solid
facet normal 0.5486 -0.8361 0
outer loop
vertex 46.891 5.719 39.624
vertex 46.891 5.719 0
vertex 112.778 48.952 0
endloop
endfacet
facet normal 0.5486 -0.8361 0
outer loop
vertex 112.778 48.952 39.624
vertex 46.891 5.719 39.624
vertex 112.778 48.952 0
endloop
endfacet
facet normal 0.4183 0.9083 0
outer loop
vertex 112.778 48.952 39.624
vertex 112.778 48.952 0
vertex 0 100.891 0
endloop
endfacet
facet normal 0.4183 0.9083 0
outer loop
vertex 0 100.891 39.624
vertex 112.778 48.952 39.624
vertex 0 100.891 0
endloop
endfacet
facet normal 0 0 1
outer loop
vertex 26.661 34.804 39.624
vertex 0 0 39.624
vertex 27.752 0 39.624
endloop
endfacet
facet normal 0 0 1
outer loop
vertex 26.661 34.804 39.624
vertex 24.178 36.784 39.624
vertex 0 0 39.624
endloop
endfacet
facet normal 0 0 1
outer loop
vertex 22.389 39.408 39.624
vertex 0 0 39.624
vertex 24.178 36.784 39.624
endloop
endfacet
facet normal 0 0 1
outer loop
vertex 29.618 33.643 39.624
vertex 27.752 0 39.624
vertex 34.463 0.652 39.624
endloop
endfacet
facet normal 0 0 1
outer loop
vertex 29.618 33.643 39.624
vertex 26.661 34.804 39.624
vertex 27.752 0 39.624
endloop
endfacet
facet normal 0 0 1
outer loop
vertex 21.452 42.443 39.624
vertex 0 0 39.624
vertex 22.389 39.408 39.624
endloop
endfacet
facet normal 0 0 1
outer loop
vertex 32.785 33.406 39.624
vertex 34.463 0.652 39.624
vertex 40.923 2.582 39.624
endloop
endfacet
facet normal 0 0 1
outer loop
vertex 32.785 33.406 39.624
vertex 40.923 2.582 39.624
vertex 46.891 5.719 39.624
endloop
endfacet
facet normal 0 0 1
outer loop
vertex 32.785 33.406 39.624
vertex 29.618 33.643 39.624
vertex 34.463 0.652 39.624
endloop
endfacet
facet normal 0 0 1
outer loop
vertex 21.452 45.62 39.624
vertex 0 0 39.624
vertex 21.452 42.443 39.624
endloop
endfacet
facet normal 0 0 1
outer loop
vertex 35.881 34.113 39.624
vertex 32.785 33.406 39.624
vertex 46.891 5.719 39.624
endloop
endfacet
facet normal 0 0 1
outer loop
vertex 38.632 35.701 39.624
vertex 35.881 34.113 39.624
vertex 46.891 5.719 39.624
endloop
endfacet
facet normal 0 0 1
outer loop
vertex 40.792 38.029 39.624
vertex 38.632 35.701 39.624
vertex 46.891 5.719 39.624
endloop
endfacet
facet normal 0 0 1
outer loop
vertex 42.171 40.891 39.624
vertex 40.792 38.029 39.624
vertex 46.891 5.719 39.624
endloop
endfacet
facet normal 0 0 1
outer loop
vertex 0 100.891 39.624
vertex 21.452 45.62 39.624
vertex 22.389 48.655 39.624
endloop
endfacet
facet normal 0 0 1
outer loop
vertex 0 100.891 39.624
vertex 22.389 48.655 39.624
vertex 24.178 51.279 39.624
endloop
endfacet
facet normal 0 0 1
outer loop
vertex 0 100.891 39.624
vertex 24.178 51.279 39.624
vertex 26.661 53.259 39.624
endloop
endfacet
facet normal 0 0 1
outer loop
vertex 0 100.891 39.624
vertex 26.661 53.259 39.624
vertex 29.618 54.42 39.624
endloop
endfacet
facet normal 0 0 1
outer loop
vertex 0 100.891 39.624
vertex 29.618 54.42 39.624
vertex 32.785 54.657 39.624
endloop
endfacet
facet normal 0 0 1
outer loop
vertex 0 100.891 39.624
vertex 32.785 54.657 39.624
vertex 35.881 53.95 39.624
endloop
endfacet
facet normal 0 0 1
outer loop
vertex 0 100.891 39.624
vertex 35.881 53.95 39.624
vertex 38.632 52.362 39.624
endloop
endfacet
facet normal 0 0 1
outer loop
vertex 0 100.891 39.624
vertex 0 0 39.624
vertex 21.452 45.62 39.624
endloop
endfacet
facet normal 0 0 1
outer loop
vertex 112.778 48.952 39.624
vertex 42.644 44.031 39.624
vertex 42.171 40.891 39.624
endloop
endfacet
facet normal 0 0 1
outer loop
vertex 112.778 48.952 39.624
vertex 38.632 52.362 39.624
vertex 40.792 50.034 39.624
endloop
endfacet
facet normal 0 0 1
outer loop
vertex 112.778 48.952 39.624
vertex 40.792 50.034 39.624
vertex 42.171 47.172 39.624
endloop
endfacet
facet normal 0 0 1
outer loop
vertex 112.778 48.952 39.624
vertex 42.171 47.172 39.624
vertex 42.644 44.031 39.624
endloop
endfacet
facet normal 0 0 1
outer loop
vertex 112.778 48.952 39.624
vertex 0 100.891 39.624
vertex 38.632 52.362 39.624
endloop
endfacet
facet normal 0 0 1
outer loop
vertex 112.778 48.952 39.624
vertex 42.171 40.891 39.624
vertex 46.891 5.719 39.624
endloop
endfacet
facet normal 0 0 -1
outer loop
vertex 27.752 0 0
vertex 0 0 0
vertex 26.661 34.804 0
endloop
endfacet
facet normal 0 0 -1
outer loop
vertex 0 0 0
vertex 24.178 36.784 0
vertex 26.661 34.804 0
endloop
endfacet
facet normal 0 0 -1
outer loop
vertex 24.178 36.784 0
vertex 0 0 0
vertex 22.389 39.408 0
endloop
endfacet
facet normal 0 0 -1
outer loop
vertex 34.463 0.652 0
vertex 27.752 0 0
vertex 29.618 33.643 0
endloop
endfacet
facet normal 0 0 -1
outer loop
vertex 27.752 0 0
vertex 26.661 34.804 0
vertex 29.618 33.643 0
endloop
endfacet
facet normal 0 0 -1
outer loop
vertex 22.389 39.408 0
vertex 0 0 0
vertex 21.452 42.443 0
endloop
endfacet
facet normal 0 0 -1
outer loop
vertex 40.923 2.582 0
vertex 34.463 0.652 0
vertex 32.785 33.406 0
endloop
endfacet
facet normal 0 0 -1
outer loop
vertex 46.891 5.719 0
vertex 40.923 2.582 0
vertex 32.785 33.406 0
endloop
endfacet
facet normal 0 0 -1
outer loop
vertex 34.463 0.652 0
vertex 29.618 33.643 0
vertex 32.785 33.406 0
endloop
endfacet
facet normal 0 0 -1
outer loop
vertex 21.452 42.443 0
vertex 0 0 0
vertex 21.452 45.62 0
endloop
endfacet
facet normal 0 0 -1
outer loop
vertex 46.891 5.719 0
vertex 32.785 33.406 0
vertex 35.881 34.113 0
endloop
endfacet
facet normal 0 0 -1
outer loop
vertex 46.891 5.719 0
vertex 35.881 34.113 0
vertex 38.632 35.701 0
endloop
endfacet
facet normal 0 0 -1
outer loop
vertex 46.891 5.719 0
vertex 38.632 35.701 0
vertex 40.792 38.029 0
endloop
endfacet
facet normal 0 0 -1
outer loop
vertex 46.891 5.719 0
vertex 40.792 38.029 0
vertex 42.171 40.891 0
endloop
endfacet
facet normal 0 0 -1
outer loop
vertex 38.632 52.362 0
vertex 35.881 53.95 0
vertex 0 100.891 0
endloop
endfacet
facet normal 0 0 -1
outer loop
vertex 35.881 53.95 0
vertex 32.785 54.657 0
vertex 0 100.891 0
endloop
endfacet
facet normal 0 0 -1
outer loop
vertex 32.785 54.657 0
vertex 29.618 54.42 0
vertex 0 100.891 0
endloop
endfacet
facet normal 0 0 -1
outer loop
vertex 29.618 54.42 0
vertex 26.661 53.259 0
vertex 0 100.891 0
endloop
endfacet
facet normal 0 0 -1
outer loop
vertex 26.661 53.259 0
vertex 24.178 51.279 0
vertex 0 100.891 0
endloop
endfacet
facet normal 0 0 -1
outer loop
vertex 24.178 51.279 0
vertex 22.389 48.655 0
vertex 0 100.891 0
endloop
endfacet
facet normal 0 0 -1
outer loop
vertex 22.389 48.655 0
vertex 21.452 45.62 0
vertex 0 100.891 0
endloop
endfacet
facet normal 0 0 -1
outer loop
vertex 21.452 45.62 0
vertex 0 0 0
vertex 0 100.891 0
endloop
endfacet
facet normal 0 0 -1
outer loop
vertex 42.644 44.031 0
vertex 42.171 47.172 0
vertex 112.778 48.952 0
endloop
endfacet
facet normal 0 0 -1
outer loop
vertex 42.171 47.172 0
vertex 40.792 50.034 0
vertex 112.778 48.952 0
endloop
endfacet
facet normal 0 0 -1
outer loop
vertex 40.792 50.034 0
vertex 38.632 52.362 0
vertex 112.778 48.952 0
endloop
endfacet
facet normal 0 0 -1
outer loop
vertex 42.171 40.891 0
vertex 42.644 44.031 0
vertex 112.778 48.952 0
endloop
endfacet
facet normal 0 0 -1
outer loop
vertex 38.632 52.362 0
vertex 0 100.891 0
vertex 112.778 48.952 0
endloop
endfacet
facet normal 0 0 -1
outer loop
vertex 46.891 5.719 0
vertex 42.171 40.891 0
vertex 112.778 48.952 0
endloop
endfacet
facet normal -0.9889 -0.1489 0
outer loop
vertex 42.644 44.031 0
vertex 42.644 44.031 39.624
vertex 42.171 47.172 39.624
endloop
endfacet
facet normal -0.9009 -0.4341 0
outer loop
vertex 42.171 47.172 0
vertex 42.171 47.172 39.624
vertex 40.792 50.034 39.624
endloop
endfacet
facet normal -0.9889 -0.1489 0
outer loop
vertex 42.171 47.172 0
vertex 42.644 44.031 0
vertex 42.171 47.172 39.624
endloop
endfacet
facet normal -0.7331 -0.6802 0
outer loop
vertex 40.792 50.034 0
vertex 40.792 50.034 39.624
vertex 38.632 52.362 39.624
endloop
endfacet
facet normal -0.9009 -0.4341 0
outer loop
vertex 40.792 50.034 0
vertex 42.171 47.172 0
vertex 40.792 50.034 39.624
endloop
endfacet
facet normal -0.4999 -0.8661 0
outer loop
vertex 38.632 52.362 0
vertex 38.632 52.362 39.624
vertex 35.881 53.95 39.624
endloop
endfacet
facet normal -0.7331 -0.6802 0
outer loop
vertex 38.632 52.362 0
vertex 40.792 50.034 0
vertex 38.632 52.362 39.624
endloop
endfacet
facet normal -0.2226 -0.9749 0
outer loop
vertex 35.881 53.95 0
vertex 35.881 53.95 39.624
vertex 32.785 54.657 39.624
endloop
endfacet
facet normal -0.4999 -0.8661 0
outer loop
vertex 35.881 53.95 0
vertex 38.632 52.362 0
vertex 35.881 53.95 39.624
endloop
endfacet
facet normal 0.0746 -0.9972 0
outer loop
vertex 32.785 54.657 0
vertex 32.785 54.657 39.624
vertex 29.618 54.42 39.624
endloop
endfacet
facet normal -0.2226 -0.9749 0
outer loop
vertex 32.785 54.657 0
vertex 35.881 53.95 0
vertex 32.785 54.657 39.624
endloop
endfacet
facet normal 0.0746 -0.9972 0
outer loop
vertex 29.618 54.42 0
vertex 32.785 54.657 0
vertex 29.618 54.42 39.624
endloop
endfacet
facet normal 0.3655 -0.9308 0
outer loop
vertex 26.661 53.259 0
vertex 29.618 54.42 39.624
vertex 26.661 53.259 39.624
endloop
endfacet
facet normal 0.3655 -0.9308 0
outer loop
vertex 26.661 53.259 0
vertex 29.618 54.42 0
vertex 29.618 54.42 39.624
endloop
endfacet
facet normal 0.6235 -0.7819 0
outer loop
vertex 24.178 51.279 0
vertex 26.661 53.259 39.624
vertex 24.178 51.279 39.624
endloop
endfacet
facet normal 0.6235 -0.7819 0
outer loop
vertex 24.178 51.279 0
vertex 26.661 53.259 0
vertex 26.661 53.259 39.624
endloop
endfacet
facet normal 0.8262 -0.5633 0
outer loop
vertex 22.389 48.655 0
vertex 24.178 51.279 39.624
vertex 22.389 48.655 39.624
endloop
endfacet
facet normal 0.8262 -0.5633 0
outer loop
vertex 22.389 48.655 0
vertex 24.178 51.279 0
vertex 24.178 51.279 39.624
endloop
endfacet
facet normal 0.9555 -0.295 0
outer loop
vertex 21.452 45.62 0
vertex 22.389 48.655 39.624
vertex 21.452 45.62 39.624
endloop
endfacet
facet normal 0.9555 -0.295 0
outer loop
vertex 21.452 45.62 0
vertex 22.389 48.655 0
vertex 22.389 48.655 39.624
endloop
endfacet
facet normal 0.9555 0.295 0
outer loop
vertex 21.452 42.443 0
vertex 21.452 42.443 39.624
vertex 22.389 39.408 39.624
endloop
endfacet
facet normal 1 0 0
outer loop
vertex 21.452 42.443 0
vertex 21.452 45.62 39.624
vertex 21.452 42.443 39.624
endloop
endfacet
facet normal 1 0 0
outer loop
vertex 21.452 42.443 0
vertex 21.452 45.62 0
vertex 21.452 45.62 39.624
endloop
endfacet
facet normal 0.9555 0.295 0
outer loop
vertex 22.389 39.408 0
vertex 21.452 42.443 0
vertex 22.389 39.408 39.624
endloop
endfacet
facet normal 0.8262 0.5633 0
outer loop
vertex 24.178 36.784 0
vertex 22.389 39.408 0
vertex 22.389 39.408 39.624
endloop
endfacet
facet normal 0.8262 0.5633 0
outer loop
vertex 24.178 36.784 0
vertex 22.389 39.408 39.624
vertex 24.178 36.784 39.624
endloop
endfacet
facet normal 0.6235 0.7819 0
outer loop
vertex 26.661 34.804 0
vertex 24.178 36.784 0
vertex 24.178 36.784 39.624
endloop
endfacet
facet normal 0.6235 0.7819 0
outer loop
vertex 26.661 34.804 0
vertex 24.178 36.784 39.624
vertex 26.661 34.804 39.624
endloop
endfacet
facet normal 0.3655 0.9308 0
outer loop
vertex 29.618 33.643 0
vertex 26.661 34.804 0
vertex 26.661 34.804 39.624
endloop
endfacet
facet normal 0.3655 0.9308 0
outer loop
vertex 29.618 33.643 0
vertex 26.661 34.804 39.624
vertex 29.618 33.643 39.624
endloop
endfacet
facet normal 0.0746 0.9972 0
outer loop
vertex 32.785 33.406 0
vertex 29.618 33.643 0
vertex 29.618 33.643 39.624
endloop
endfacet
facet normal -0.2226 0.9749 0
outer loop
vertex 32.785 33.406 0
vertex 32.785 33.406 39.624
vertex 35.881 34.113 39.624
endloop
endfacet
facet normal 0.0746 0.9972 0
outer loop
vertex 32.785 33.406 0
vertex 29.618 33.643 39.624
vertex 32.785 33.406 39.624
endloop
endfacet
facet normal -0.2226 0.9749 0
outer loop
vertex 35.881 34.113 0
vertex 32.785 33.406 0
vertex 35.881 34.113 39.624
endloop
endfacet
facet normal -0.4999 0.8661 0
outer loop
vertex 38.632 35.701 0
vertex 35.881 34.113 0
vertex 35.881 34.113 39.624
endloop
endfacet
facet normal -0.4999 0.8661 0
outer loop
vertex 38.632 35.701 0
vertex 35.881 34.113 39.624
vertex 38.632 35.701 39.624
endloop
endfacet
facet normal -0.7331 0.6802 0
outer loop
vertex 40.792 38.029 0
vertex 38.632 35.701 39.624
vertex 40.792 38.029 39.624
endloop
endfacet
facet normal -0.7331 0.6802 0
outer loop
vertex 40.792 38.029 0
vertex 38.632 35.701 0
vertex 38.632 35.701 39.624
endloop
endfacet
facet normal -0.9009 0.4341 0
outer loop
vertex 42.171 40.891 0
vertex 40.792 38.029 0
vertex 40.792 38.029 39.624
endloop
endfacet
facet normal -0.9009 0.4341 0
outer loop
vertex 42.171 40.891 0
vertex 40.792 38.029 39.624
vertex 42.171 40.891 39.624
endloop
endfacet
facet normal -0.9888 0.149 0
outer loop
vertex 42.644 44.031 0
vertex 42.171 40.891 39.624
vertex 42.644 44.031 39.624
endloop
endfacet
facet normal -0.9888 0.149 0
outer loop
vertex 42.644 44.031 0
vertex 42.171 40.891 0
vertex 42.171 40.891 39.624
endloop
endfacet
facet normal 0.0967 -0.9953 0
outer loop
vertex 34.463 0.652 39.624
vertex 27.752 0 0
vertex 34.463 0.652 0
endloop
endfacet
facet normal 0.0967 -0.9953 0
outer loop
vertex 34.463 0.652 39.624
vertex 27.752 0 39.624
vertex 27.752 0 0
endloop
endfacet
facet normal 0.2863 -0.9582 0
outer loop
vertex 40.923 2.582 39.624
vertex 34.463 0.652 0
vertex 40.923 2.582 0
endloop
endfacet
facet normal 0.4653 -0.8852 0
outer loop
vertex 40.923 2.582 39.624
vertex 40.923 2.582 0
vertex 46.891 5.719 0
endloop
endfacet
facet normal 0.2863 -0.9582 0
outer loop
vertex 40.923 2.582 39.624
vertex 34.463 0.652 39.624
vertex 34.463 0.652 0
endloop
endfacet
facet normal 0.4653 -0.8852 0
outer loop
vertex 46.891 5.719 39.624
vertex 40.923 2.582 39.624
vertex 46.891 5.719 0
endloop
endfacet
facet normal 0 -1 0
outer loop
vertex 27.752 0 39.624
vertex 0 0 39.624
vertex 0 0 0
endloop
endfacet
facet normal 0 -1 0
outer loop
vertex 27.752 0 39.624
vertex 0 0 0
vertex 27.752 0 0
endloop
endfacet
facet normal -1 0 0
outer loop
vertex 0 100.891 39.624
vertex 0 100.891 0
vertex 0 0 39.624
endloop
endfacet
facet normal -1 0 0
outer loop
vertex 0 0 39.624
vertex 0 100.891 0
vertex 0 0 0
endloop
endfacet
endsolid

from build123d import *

# Parameters (mm, degrees)
F1_DEPTH = 39.624
F2_R     = 34.885531
F3_R     = 10.6553
F4_DEPTH = 91.186


with BuildPart() as f1:
    # F0 (on Top) → F1 (new body)
    with BuildSketch(Plane.XY):
        Polygon((0, 100.89088), (0, 0), (38.1762, 0), (112.777971, 48.952073), align=None)
    extrude(amount=F1_DEPTH)

    # F2
    f2_edges = [f1.edges().sort_by_distance(p)[0] for p in [
        (38.1762, 0, 19.812),
    ]]
    fillet(f2_edges, radius=F2_R)

    # F3 (on Top) → F4 (cut)
    with BuildSketch(Plane.XY):
        with Locations((31.988665, 44.031467)):
            Circle(F3_R)
    extrude(amount=F4_DEPTH, mode=Mode.SUBTRACT)


solid = f1.part
